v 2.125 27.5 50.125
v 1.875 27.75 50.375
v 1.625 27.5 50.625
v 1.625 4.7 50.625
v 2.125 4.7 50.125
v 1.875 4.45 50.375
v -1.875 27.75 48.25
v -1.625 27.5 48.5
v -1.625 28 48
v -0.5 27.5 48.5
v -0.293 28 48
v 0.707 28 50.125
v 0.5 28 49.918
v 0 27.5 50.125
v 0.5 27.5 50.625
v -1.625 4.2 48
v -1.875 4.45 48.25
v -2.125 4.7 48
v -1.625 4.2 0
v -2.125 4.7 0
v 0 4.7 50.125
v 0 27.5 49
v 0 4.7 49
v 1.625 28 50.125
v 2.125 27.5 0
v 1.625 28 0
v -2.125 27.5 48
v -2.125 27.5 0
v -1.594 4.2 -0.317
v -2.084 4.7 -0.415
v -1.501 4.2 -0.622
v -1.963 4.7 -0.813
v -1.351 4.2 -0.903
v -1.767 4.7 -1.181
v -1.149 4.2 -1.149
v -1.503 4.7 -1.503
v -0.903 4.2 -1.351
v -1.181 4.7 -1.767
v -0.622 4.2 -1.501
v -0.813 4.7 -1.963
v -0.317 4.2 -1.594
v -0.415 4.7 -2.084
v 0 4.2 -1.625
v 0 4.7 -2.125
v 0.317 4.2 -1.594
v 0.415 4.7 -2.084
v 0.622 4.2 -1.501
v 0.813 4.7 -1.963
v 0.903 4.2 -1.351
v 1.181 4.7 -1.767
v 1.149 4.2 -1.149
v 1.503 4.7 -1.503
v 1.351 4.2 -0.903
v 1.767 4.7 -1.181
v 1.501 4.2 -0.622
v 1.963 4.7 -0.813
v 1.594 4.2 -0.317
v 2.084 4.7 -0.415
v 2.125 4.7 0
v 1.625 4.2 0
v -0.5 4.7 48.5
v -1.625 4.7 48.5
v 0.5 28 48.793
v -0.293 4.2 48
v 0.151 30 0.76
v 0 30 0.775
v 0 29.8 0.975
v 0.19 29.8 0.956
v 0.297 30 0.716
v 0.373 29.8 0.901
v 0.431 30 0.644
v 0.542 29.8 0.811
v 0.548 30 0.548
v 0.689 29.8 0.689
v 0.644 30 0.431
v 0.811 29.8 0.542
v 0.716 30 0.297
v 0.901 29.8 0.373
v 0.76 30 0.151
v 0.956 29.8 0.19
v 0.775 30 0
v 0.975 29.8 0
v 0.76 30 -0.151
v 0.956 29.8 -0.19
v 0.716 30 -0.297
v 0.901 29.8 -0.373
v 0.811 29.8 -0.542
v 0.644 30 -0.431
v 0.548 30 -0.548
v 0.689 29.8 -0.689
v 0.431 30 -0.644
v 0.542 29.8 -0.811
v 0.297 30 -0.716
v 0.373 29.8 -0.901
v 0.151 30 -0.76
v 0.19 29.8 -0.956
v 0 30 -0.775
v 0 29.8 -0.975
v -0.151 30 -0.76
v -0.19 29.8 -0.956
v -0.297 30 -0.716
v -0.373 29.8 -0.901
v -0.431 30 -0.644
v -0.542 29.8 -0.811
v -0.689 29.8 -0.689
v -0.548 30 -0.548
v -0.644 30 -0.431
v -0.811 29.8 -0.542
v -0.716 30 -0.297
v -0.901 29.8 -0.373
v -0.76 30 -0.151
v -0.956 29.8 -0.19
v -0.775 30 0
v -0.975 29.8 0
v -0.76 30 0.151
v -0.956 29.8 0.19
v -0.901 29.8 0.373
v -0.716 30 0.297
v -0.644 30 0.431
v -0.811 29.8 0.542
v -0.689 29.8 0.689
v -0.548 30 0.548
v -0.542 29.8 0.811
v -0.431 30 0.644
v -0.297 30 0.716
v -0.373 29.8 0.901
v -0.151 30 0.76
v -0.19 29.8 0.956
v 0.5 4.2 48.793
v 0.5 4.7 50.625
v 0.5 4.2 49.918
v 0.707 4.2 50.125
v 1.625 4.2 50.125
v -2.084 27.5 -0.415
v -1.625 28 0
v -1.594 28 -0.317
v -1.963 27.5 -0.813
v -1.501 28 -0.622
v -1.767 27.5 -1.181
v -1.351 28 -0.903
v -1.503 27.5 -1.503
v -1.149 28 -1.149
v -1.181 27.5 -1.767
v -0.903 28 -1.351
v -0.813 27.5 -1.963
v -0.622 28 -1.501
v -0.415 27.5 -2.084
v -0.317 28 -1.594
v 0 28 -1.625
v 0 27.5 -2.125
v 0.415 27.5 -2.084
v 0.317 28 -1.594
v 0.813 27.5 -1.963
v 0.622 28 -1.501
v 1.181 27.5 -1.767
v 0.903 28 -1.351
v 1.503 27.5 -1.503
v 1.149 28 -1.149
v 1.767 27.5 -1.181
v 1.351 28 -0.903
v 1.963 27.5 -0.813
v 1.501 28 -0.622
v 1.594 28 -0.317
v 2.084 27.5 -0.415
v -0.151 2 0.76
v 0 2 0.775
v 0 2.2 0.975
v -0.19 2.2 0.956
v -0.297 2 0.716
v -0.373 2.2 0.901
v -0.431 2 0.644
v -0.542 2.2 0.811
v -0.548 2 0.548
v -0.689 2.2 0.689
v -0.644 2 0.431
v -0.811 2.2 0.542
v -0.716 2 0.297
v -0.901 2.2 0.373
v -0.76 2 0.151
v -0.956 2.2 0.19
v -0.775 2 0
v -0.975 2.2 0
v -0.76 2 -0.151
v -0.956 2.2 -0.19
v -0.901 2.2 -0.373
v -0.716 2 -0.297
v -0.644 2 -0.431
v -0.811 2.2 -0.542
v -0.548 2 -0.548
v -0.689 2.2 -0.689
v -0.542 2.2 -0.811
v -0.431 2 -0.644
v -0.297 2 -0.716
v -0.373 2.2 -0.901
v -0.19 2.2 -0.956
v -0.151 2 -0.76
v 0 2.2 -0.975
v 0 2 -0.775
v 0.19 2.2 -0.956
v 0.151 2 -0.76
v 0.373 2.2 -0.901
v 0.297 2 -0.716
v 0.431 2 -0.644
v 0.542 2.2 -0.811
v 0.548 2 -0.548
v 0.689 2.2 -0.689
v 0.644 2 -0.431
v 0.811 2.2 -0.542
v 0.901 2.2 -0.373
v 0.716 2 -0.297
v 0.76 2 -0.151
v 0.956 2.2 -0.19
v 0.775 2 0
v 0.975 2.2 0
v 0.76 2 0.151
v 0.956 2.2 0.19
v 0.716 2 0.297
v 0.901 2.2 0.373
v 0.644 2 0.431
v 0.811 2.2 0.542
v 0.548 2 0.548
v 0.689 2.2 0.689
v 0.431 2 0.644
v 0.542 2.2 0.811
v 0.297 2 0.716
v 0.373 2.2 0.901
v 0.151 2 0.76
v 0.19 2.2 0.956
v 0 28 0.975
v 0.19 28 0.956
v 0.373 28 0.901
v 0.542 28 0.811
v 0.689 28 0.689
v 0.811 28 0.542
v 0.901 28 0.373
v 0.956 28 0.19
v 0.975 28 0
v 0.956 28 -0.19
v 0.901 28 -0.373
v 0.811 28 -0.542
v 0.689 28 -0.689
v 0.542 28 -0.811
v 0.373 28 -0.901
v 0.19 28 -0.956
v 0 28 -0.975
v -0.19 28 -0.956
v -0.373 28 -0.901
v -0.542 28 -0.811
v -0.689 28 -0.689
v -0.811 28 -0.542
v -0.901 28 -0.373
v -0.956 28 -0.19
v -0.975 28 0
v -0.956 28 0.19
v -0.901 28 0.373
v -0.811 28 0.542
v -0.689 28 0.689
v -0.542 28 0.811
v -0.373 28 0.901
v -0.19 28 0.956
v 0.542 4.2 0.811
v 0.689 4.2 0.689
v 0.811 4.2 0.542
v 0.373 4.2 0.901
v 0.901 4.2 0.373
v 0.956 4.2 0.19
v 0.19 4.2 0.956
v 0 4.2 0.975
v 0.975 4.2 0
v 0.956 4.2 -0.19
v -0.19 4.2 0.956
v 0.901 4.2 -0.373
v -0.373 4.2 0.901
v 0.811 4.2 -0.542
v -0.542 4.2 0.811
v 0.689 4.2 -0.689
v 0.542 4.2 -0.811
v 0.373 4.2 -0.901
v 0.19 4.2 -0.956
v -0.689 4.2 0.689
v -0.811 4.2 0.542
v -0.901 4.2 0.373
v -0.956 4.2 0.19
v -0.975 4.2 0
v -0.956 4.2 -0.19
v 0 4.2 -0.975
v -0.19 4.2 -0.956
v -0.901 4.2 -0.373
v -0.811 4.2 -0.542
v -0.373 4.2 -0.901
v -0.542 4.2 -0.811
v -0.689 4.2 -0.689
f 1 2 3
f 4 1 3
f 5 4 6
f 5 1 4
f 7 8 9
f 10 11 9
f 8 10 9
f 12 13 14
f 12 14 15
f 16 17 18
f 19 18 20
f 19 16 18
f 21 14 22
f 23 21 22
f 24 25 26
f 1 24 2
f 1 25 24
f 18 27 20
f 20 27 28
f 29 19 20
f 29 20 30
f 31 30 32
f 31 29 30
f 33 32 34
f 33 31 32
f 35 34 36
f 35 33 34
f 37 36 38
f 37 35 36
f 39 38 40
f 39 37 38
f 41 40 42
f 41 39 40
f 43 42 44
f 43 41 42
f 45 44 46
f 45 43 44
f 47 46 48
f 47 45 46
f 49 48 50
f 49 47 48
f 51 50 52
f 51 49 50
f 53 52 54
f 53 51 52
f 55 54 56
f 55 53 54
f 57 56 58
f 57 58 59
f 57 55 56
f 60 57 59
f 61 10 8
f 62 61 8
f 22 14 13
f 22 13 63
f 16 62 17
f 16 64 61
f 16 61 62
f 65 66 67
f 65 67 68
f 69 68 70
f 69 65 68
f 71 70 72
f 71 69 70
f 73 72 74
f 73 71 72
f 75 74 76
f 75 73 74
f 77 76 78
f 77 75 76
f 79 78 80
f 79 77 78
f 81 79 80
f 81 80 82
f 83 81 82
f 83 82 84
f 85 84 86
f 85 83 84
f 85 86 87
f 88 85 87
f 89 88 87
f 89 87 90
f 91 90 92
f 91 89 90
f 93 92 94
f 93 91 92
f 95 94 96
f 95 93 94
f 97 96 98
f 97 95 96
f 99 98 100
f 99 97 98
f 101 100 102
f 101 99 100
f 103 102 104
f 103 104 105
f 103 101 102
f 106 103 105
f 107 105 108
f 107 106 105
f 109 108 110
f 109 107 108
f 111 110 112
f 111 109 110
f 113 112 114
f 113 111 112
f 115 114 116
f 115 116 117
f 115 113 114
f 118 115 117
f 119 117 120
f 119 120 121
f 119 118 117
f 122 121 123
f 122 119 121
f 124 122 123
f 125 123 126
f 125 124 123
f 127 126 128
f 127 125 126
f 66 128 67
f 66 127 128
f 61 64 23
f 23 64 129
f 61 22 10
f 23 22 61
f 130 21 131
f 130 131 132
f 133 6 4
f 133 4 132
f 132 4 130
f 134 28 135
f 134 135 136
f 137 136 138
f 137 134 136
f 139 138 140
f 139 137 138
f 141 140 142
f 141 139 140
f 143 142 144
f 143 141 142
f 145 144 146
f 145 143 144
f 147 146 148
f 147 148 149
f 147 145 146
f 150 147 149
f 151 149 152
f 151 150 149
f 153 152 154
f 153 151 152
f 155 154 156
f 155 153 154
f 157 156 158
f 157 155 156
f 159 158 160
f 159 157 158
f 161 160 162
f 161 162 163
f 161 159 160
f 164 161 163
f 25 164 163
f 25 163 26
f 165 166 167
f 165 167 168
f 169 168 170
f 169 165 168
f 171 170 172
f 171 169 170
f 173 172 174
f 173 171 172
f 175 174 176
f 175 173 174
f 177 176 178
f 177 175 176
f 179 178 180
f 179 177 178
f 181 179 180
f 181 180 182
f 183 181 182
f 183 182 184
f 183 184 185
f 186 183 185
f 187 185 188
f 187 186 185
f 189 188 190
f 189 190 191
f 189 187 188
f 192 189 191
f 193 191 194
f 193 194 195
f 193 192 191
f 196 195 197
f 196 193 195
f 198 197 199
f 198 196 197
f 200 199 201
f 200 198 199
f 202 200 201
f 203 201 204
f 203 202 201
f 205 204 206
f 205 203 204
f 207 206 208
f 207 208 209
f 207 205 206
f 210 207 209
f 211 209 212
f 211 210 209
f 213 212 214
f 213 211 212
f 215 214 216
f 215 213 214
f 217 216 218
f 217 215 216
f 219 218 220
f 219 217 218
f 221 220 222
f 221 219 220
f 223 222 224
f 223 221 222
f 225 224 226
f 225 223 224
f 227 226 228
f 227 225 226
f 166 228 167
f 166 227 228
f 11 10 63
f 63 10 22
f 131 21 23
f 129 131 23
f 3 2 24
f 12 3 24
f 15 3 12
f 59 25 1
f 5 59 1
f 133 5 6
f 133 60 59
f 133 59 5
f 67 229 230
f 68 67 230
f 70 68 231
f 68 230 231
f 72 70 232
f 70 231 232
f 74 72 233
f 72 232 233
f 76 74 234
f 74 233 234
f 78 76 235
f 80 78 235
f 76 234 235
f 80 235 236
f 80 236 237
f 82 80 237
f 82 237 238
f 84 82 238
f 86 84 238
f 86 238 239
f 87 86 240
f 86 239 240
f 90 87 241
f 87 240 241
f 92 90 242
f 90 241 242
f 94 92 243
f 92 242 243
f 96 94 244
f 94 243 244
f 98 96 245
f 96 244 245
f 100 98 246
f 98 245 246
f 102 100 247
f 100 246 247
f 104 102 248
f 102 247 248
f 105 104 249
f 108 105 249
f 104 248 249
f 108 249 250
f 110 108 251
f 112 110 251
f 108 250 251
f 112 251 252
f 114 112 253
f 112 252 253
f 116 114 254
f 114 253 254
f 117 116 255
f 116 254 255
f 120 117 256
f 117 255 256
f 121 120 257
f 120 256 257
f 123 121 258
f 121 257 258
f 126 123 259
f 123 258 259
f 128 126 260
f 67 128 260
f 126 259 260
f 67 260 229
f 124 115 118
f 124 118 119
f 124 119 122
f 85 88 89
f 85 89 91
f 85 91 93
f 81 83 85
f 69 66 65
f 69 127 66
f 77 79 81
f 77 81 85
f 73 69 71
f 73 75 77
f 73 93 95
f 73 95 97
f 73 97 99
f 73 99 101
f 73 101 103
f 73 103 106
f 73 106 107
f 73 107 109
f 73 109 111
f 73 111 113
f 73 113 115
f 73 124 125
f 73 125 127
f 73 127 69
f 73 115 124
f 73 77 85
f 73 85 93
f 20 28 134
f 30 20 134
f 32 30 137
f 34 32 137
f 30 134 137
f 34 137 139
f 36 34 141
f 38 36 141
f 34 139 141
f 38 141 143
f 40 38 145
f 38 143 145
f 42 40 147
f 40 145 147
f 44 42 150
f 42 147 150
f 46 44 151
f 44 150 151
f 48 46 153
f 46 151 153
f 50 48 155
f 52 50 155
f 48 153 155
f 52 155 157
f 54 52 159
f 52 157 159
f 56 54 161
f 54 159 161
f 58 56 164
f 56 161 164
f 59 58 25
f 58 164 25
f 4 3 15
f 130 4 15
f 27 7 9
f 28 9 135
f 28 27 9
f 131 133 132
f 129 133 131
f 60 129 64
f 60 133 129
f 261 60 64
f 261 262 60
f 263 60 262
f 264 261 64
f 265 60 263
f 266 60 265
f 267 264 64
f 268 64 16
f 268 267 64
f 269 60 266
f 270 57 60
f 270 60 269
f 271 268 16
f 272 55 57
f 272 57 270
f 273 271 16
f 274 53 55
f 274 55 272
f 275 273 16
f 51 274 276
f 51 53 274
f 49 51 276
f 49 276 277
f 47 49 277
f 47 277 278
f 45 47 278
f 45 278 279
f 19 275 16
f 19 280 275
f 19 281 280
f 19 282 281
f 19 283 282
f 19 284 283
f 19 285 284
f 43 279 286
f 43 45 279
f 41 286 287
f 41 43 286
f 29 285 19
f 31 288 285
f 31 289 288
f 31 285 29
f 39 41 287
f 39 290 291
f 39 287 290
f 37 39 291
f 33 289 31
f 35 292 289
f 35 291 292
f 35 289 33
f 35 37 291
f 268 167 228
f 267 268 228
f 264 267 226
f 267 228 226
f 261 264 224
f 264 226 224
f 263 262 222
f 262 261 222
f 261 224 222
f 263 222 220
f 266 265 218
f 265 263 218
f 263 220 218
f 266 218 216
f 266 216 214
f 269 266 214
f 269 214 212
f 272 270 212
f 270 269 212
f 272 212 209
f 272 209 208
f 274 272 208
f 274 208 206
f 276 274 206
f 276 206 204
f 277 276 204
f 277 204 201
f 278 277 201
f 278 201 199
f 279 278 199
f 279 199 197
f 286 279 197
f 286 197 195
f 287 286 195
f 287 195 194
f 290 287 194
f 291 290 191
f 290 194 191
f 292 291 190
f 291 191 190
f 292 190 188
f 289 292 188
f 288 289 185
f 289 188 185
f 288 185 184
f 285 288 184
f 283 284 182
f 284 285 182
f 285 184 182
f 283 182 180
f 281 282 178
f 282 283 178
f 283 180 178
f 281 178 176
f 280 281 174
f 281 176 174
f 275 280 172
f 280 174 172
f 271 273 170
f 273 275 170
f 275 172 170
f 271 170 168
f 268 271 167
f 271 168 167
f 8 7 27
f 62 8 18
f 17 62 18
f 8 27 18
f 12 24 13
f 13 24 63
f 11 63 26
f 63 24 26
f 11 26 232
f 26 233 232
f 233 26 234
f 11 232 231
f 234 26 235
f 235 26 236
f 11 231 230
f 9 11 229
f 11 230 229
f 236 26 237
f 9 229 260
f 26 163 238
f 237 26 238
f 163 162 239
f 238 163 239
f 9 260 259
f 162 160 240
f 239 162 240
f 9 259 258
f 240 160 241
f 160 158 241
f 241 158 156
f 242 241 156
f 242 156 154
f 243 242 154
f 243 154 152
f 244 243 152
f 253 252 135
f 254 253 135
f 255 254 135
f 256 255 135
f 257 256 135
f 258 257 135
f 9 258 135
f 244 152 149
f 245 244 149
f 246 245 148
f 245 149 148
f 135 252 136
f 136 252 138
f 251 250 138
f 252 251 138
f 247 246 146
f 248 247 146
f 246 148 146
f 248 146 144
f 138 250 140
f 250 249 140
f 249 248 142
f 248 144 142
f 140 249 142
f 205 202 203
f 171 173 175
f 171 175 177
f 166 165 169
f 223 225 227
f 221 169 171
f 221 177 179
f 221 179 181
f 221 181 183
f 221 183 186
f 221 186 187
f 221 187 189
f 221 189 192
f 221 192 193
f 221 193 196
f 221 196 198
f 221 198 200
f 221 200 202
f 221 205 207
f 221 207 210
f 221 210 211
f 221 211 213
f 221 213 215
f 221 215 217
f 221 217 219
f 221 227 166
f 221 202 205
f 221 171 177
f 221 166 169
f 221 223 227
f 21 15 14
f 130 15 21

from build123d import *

# Parameters (mm, degrees)
SKETCH_2_R          = 0.975
EXTRUDE_1_DEPTH     = 28
EXTRUDE_2_DEPTH     = 23.8
SKETCH_5_R          = 0.975
EXTRUDE_3_DEPTH     = 2
CUT_EXTRUDE_START   = -2
SKETCH_7_R          = 2.125
CUT_EXTRUDE_1_DEPTH = 2
CHAMFER_1_SIZE      = 0.5
CHAMFER_2_SIZE      = 0.5
CHAMFER_3_SIZE      = 0.5
CHAMFER_4_SIZE      = 0.5
CHAMFER_7_SIZE      = 0.2


with BuildPart() as part:
    # 草图2 → 凸台-拉伸1 (new body)
    with BuildSketch(Plane(origin=(0, 0, 0), x_dir=(1, 0, 0), z_dir=(0, 1, 0))):
        with Locations(Location((0, 0, 0), (0, 0, 270))):
            Circle(SKETCH_2_R)
    extrude(amount=EXTRUDE_1_DEPTH)

    # 草图4 → 凸台-拉伸2 (add)
    with BuildSketch(Plane(origin=(0, 28, 0), x_dir=(1, 0, 0), z_dir=(0, 1, 0))):
        with BuildLine():
            Line((0, -48.5), (-2.125, -48.5))
            Line((-2.125, -48.5), (-2.125, 0))
            ThreePointArc((-2.125, 0), (0, 2.125), (2.125, 0))
            Line((2.125, 0), (2.125, -47.7))
            Line((2.125, -47.7), (2.125, -50.625))
            Line((2.125, -50.625), (0, -50.625))
            Line((0, -50.625), (0, -48.5))
        make_face()
    extrude(amount=-EXTRUDE_2_DEPTH)

    # 草图5 → 凸台-拉伸3 (add)
    with BuildSketch(Plane(origin=(0, 28, 0), x_dir=(1, 0, 0), z_dir=(0, 1, 0))):
        with Locations(Location((0, 0, 0), (0, 0, 270))):
            Circle(SKETCH_5_R)
    extrude(amount=EXTRUDE_3_DEPTH)

    # 草图7 → 切除-拉伸1 (cut)
    with BuildSketch(Plane.XZ.offset(CUT_EXTRUDE_START)):
        Circle(SKETCH_7_R)
    extrude(amount=CUT_EXTRUDE_1_DEPTH, mode=Mode.SUBTRACT)

    # 倒角1
    chamfer_1_edges = [part.edges().sort_by_distance(p)[0] for p in [
        (2.125, 28, 25.3125),
        (0, 28, -2.125),
        (-2.125, 28, 24.25),
        (-2.125, 4.2, 24.25),
        (0, 4.2, -2.125),
        (2.125, 4.2, 25.3125),
    ]]
    chamfer(chamfer_1_edges, length=CHAMFER_1_SIZE)

    # 倒角2
    chamfer_2_edges = [part.edges().sort_by_distance(p)[0] for p in [
        (-2.125, 16.1, 48.5),
        (2.125, 16.1, 50.625),
    ]]
    chamfer(chamfer_2_edges, length=CHAMFER_2_SIZE)

    # 倒角3
    chamfer_3_edges = [part.edges().sort_by_distance(p)[0] for p in [
        (0, 16.1, 50.625),
        (0, 16.1, 48.5),
    ]]
    chamfer(chamfer_3_edges, length=CHAMFER_3_SIZE)

    # 倒角4
    chamfer_4_edges = [part.edges().sort_by_distance(p)[0] for p in [
        (-1.0625, 28, 48.5),
        (-1.0625, 4.2, 48.5),
        (0, 28, 49.5625),
        (0, 4.2, 49.5625),
        (1.0625, 28, 50.625),
        (0.25, 28, 50.375),
        (1.0625, 4.2, 50.625),
        (0.25, 4.2, 50.375),
        (-0.25, 28, 48.75),
        (-0.25, 4.2, 48.75),
    ]]
    chamfer(chamfer_4_edges, length=CHAMFER_4_SIZE)

    # 倒角7
    chamfer_7_edges = [part.edges().sort_by_distance(p)[0] for p in [
        (0, 30, -0.975),
        (0, 2, -0.975),
    ]]
    chamfer(chamfer_7_edges, length=CHAMFER_7_SIZE)


solid = part.part
